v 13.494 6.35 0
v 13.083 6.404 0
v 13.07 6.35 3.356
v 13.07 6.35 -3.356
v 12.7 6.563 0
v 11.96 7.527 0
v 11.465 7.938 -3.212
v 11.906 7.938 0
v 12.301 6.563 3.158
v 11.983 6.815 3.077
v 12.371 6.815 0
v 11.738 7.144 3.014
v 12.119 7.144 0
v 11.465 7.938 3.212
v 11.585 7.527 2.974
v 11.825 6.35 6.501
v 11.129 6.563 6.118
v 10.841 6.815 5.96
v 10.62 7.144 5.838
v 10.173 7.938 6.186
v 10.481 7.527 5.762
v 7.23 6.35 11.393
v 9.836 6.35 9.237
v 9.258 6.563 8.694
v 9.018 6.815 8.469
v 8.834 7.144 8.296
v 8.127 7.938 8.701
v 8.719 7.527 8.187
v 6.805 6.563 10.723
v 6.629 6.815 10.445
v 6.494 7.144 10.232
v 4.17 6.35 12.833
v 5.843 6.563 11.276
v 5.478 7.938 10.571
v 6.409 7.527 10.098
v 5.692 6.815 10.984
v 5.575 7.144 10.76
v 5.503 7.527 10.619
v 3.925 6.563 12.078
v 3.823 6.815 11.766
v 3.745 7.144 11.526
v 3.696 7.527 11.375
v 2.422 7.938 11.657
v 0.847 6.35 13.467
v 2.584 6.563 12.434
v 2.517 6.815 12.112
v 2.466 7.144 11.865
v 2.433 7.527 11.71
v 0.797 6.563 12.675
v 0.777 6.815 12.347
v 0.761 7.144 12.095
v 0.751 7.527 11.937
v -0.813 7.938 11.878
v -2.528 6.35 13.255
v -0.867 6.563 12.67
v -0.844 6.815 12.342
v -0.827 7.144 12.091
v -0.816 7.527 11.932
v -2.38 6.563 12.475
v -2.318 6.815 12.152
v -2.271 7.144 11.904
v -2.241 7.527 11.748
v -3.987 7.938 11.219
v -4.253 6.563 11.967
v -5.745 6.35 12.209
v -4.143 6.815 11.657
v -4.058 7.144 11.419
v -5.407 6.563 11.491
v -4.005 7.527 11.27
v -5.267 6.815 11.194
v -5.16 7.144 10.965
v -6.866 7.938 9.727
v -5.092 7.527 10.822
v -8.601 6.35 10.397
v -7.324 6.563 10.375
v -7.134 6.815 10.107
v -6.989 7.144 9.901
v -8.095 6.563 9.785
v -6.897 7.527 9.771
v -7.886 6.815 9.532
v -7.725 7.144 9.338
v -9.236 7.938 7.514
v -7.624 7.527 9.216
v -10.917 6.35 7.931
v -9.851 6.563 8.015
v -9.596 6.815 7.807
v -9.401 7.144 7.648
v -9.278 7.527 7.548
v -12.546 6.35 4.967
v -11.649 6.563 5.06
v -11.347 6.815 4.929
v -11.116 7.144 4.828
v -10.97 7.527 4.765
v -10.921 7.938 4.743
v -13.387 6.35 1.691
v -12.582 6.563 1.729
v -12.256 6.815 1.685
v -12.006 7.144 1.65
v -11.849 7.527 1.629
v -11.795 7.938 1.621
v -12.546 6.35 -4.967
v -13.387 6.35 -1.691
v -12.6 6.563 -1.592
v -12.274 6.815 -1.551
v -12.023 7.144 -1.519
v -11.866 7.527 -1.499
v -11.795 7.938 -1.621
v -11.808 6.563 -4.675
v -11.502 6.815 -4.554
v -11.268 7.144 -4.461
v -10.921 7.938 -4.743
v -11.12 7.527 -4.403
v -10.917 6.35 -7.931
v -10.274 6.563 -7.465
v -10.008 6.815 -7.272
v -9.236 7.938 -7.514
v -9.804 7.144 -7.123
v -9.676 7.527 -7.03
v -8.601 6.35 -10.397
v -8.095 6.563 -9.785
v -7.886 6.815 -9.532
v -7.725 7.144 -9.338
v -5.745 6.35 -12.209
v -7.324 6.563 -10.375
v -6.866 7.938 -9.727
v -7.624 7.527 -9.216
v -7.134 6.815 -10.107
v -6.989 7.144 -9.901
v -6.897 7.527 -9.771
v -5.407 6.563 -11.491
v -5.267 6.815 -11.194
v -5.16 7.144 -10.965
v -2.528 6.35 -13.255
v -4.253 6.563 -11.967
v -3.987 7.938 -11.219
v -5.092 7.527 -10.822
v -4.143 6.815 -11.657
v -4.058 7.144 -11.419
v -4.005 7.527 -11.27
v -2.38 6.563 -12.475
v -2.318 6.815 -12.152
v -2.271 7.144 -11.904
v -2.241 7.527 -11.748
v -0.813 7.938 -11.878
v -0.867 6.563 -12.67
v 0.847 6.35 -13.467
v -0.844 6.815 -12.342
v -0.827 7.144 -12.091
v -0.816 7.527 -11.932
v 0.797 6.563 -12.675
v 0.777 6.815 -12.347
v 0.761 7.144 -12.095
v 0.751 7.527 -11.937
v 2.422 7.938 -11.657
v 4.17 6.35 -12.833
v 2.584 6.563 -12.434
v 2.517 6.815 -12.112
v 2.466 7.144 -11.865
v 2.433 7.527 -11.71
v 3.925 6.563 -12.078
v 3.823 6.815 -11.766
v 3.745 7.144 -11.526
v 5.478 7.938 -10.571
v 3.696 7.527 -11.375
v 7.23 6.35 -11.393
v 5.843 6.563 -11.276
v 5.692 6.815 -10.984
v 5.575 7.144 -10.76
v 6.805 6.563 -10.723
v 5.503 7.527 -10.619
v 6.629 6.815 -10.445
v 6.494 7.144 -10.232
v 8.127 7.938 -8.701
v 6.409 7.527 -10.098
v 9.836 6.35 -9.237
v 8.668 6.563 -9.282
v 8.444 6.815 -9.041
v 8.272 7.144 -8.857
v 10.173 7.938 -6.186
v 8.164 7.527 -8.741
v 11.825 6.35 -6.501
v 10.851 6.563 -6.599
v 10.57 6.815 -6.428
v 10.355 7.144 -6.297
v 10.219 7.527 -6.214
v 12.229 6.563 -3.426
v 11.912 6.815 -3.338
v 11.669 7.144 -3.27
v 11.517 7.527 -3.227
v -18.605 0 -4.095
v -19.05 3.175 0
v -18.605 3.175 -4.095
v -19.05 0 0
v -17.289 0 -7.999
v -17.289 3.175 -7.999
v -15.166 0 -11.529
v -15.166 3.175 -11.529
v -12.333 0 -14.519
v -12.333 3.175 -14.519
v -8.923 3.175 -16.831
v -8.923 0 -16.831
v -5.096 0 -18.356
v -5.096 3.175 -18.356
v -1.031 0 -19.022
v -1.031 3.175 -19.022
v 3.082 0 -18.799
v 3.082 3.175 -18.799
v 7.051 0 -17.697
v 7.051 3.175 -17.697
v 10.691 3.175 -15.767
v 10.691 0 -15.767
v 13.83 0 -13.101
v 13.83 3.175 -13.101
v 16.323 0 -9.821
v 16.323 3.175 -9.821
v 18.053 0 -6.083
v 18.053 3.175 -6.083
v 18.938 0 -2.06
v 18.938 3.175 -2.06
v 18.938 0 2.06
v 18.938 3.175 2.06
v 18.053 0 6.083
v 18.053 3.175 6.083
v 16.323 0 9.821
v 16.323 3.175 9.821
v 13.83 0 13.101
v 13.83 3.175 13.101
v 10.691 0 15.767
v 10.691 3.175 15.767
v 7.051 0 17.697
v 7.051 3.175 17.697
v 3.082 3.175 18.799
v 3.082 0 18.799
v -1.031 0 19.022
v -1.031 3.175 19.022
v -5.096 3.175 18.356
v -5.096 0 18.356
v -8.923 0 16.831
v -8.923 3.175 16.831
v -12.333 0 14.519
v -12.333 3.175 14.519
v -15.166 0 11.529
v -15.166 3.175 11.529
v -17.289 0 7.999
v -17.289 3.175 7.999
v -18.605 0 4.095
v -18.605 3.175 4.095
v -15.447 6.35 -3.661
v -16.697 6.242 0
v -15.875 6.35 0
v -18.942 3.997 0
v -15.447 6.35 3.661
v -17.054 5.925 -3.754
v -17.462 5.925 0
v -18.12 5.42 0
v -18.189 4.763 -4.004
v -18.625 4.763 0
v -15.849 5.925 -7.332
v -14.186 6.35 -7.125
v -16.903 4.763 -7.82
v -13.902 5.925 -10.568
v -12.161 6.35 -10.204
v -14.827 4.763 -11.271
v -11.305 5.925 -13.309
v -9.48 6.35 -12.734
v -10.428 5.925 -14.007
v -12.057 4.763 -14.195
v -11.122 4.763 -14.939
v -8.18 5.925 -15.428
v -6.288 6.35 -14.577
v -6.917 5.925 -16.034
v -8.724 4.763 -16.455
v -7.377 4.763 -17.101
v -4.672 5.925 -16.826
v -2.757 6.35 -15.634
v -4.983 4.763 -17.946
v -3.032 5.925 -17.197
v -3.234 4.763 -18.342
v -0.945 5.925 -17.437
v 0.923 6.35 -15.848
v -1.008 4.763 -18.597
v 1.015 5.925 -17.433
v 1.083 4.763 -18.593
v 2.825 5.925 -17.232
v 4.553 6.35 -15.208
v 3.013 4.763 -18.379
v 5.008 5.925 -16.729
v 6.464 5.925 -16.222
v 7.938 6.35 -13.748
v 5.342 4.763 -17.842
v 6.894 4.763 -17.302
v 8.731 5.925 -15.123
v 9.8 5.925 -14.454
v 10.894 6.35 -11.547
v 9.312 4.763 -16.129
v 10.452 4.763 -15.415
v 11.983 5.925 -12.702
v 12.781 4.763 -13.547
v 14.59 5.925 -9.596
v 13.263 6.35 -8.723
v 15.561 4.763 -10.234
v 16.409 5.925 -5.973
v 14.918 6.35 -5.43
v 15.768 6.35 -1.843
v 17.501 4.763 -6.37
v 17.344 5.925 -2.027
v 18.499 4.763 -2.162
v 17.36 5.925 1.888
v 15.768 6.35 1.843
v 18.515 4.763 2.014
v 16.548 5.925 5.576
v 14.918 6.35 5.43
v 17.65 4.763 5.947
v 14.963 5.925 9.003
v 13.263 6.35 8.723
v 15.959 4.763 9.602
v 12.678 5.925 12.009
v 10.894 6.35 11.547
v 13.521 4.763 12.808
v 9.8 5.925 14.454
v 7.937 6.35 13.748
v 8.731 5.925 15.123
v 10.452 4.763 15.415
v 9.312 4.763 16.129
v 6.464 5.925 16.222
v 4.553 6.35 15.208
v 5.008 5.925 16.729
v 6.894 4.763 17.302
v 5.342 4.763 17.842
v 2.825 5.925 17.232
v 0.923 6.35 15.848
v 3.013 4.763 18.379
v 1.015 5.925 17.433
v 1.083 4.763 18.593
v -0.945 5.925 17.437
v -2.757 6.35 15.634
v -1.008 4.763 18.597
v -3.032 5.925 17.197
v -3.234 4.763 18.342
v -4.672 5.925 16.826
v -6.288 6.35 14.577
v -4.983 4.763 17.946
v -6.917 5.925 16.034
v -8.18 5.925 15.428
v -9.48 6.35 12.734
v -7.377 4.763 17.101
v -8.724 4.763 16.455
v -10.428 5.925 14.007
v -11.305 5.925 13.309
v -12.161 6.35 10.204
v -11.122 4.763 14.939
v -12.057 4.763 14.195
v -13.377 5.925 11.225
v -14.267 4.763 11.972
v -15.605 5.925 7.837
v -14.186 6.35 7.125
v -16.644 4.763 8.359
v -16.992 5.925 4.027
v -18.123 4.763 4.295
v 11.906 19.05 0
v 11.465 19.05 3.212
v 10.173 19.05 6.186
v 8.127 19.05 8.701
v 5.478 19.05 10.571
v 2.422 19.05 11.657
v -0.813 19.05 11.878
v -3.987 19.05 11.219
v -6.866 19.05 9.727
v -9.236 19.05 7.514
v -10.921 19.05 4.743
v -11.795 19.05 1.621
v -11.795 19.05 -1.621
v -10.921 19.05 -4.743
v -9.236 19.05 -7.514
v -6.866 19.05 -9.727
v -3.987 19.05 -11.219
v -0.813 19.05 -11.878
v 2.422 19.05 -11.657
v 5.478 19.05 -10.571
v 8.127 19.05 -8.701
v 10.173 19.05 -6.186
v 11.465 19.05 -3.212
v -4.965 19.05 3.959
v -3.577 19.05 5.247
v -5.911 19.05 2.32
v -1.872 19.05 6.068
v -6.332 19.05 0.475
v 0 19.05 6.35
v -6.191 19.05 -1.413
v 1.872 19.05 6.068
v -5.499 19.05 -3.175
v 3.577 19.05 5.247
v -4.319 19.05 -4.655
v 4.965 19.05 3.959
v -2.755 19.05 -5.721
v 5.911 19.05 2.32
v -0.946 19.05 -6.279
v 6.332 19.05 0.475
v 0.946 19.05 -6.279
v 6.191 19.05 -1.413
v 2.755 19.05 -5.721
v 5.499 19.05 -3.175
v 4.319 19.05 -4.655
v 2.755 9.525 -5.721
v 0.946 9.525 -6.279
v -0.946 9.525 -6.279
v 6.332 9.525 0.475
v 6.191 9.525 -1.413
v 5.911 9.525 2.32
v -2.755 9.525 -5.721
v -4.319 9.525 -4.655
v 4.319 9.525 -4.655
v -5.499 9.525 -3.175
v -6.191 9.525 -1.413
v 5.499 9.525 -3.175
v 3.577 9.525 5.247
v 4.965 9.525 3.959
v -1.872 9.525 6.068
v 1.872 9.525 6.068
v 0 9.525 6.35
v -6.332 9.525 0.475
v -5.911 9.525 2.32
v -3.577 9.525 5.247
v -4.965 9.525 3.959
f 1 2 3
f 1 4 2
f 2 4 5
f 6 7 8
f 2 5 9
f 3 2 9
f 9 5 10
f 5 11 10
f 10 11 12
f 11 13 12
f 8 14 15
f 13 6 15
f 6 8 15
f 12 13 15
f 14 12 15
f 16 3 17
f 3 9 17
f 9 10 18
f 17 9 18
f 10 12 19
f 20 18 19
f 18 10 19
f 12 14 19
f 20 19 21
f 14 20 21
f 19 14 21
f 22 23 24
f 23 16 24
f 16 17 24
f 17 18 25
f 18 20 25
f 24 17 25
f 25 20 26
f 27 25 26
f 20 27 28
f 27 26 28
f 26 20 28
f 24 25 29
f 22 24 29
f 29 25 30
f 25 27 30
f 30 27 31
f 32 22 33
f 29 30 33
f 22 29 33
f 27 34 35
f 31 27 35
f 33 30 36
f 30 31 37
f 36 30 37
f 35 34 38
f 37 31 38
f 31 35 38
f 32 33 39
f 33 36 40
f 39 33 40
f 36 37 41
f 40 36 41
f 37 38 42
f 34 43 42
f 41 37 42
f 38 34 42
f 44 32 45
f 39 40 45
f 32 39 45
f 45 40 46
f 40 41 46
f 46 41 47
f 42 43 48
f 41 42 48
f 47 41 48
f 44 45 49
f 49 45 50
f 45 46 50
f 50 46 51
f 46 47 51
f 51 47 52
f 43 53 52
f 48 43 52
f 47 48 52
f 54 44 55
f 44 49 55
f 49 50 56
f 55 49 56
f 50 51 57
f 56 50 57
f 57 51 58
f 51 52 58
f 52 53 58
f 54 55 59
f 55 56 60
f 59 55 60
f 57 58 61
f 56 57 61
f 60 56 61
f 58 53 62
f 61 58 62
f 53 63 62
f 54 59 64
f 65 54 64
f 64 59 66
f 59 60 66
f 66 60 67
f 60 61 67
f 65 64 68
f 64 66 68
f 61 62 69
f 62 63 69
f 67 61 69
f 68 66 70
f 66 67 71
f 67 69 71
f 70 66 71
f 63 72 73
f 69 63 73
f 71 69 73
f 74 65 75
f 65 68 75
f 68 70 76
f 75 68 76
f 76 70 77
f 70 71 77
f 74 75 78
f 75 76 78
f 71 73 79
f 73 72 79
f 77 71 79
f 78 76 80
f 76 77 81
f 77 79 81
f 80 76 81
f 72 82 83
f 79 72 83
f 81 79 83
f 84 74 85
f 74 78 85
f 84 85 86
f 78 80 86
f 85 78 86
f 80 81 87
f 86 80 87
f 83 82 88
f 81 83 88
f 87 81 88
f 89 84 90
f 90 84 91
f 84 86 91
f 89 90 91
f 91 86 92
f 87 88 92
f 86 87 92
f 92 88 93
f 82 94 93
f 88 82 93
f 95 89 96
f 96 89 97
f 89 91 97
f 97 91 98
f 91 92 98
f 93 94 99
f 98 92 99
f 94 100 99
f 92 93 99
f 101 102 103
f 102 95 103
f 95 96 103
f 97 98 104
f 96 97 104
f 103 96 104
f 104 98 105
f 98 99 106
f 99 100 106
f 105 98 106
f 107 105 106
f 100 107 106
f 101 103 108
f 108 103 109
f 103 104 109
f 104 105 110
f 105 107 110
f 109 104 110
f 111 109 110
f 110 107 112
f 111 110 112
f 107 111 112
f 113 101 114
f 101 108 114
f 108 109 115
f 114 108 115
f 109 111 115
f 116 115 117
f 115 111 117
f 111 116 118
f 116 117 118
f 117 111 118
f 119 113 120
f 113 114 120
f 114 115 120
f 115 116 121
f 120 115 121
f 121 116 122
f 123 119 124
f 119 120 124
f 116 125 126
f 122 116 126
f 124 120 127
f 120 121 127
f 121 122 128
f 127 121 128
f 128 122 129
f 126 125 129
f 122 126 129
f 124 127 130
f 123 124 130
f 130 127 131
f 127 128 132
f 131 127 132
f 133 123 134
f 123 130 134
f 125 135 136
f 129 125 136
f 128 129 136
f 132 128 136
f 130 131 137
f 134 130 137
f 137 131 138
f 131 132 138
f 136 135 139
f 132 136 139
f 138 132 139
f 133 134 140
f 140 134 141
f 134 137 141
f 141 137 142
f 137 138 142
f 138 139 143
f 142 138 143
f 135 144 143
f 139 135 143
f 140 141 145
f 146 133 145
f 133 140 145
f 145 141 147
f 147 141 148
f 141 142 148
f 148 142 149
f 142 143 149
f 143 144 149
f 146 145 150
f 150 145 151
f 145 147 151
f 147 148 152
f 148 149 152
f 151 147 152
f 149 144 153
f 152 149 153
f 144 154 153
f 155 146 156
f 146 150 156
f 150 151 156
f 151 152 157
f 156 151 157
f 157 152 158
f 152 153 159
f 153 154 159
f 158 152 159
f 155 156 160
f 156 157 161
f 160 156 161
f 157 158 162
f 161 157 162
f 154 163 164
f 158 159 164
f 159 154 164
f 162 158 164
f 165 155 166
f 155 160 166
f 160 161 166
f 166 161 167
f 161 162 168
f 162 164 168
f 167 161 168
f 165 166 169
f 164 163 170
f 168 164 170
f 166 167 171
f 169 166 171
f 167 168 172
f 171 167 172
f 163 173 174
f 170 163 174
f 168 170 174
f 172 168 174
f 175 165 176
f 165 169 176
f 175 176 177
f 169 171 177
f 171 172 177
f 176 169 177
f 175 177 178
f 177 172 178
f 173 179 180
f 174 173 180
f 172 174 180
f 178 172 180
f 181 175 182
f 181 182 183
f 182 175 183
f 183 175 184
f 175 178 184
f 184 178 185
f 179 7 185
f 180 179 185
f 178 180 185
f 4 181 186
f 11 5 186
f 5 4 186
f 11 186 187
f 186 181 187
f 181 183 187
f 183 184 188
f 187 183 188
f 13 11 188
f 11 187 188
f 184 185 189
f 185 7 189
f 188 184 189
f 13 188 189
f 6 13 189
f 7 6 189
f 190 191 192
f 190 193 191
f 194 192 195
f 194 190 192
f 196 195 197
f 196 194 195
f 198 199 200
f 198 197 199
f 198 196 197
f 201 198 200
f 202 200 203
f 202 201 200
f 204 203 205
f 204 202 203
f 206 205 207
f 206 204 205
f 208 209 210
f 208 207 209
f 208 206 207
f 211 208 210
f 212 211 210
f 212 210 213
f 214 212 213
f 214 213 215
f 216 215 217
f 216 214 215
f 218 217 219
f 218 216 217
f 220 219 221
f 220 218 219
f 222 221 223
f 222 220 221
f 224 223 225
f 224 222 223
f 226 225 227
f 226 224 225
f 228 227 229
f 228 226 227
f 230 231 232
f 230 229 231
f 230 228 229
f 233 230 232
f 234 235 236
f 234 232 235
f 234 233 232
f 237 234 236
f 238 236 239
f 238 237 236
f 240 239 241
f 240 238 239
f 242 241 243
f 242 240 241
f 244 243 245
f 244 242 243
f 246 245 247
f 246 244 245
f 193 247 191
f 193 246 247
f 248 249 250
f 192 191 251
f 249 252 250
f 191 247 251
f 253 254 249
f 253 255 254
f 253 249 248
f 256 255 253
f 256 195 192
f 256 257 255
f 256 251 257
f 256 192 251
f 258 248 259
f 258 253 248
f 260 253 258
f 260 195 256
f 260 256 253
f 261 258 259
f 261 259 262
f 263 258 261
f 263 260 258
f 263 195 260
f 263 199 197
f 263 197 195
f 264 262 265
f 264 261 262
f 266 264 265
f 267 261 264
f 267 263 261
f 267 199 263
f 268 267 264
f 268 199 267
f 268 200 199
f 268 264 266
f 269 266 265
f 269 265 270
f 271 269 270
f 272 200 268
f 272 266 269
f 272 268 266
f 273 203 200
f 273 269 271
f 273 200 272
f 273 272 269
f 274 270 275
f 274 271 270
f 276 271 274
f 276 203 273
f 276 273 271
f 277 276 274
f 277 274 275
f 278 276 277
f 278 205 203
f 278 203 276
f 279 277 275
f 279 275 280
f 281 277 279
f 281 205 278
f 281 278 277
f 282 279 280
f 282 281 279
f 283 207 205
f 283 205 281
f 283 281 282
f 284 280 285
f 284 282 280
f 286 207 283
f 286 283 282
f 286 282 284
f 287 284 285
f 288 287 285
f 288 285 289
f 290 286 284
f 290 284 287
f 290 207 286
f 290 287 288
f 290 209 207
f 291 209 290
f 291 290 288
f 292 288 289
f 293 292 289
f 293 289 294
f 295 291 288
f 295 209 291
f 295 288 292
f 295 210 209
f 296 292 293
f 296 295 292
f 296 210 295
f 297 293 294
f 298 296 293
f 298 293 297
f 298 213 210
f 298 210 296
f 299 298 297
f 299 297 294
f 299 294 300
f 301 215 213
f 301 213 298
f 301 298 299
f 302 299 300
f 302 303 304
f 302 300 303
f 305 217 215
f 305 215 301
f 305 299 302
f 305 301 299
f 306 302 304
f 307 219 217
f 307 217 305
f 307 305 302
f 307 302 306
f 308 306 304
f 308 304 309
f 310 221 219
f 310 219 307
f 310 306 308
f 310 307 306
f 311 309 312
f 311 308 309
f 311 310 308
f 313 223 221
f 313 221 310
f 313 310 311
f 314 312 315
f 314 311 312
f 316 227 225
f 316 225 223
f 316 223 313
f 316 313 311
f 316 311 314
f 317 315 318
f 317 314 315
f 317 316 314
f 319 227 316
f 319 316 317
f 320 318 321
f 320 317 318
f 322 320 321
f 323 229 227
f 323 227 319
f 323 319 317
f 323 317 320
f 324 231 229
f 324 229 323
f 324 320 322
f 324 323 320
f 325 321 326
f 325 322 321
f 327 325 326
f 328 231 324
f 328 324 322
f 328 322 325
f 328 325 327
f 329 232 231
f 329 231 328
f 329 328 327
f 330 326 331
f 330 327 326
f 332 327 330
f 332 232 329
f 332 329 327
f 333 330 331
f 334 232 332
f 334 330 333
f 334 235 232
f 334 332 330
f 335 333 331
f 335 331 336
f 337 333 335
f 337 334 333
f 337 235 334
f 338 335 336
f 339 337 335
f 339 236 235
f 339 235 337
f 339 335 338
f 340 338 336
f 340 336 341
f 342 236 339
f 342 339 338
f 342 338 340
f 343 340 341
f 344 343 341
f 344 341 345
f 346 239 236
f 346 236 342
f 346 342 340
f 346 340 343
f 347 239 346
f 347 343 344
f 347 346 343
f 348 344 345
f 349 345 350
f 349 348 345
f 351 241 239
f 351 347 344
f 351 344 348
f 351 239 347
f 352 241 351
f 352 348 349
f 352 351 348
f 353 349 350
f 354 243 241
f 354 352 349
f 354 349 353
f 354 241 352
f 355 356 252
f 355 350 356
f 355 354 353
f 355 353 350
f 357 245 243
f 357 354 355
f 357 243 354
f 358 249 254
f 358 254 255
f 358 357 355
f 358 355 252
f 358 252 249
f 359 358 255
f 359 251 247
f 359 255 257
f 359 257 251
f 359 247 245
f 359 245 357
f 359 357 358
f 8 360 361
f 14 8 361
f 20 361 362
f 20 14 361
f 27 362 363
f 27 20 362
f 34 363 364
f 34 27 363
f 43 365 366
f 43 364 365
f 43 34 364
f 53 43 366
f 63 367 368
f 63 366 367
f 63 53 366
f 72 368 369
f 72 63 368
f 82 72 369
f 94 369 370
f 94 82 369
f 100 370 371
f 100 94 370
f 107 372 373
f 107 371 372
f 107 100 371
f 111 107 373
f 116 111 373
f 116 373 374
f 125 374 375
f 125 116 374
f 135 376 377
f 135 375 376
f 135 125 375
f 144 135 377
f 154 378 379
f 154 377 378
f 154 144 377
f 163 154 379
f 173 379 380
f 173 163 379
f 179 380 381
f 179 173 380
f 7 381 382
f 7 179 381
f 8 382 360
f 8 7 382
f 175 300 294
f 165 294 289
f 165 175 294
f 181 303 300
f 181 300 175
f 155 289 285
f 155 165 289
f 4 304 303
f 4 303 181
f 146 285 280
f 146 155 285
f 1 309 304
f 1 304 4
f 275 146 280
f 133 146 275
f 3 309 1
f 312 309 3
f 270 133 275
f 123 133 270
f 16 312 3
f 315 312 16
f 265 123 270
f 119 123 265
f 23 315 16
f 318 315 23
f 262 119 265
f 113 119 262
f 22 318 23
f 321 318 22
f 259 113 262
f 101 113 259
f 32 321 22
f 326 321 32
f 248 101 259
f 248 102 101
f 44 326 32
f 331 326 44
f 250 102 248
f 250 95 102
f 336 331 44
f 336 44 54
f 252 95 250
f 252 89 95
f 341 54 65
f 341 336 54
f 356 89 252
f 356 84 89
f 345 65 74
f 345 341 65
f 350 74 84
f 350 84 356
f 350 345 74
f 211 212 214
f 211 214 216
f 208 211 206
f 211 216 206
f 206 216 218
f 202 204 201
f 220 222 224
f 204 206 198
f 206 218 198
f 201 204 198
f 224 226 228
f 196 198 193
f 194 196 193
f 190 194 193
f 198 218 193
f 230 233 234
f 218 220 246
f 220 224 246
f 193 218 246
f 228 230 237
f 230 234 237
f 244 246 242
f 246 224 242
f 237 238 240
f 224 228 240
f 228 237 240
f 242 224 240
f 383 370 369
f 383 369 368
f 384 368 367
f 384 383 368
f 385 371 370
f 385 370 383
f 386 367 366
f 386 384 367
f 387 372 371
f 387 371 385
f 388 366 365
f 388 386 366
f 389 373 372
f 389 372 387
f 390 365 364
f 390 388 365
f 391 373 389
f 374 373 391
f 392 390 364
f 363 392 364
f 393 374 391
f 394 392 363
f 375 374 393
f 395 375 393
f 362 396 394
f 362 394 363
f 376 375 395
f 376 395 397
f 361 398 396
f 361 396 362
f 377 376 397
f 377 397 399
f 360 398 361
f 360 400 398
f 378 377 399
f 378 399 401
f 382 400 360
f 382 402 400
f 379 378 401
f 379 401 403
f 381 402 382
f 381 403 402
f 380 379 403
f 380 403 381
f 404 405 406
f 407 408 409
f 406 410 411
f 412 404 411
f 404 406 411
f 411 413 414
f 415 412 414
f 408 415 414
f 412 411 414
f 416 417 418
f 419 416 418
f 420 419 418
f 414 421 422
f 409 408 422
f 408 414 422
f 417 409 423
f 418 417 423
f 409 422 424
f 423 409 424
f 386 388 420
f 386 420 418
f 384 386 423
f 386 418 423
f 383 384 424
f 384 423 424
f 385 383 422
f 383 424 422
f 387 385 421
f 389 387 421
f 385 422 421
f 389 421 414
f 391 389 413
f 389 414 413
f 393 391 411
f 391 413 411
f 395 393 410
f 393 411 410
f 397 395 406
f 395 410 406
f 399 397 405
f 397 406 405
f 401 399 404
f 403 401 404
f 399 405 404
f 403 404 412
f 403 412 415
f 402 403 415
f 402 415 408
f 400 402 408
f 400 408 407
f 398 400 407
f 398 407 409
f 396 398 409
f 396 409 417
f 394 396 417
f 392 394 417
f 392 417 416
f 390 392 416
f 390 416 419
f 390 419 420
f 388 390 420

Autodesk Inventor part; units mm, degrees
ref_plane "YZ Plane" through (0, 0, 0) normal (1, 0, 0) x (0, 1, 0)
ref_plane "XZ Plane" through (0, 0, 0) normal (0, 1, 0) x (-1, 0, 0)
ref_plane "XY Plane" through (0, 0, 0) normal (0, 0, 1) x (1, 0, 0)
sketch "Sketch1" plane through (0, 0, 0) normal (0, 1, 0) x (-1, 0, 0)
  circle A0 centre (0, 0) radius 19.05
  dimension "d0" = 38.1
extrude "Extrusion1" add sketch "Sketch1" along normal blind 6.35
sketch "Sketch2" plane through (0, 6.35, 0) normal (0, 1, 0) x (1, 0, 0)
  circle A0 centre (0, 0) radius 11.9062
  dimension "d3" = 23.8125
extrude "Extrusion2" add sketch "Sketch2" along normal blind 12.7
sketch "Sketch3" plane through (0, 19.05, 0) normal (0, 1, 0) x (1, 0, 0)
  circle A0 centre (0, 0) radius 11.9062 projected
hole "Hole1" at (0, 19.05, 0) direction (0, -1, 0) diameter 12.7 depth 9.525
fillet "Fillet1" radius 1.5875 1 edges at (-11.9062, 6.35, 0)
fillet "Fillet2" radius 3.175 1 edges at (19.05, 6.35, 0)
properties part number "Feet"
